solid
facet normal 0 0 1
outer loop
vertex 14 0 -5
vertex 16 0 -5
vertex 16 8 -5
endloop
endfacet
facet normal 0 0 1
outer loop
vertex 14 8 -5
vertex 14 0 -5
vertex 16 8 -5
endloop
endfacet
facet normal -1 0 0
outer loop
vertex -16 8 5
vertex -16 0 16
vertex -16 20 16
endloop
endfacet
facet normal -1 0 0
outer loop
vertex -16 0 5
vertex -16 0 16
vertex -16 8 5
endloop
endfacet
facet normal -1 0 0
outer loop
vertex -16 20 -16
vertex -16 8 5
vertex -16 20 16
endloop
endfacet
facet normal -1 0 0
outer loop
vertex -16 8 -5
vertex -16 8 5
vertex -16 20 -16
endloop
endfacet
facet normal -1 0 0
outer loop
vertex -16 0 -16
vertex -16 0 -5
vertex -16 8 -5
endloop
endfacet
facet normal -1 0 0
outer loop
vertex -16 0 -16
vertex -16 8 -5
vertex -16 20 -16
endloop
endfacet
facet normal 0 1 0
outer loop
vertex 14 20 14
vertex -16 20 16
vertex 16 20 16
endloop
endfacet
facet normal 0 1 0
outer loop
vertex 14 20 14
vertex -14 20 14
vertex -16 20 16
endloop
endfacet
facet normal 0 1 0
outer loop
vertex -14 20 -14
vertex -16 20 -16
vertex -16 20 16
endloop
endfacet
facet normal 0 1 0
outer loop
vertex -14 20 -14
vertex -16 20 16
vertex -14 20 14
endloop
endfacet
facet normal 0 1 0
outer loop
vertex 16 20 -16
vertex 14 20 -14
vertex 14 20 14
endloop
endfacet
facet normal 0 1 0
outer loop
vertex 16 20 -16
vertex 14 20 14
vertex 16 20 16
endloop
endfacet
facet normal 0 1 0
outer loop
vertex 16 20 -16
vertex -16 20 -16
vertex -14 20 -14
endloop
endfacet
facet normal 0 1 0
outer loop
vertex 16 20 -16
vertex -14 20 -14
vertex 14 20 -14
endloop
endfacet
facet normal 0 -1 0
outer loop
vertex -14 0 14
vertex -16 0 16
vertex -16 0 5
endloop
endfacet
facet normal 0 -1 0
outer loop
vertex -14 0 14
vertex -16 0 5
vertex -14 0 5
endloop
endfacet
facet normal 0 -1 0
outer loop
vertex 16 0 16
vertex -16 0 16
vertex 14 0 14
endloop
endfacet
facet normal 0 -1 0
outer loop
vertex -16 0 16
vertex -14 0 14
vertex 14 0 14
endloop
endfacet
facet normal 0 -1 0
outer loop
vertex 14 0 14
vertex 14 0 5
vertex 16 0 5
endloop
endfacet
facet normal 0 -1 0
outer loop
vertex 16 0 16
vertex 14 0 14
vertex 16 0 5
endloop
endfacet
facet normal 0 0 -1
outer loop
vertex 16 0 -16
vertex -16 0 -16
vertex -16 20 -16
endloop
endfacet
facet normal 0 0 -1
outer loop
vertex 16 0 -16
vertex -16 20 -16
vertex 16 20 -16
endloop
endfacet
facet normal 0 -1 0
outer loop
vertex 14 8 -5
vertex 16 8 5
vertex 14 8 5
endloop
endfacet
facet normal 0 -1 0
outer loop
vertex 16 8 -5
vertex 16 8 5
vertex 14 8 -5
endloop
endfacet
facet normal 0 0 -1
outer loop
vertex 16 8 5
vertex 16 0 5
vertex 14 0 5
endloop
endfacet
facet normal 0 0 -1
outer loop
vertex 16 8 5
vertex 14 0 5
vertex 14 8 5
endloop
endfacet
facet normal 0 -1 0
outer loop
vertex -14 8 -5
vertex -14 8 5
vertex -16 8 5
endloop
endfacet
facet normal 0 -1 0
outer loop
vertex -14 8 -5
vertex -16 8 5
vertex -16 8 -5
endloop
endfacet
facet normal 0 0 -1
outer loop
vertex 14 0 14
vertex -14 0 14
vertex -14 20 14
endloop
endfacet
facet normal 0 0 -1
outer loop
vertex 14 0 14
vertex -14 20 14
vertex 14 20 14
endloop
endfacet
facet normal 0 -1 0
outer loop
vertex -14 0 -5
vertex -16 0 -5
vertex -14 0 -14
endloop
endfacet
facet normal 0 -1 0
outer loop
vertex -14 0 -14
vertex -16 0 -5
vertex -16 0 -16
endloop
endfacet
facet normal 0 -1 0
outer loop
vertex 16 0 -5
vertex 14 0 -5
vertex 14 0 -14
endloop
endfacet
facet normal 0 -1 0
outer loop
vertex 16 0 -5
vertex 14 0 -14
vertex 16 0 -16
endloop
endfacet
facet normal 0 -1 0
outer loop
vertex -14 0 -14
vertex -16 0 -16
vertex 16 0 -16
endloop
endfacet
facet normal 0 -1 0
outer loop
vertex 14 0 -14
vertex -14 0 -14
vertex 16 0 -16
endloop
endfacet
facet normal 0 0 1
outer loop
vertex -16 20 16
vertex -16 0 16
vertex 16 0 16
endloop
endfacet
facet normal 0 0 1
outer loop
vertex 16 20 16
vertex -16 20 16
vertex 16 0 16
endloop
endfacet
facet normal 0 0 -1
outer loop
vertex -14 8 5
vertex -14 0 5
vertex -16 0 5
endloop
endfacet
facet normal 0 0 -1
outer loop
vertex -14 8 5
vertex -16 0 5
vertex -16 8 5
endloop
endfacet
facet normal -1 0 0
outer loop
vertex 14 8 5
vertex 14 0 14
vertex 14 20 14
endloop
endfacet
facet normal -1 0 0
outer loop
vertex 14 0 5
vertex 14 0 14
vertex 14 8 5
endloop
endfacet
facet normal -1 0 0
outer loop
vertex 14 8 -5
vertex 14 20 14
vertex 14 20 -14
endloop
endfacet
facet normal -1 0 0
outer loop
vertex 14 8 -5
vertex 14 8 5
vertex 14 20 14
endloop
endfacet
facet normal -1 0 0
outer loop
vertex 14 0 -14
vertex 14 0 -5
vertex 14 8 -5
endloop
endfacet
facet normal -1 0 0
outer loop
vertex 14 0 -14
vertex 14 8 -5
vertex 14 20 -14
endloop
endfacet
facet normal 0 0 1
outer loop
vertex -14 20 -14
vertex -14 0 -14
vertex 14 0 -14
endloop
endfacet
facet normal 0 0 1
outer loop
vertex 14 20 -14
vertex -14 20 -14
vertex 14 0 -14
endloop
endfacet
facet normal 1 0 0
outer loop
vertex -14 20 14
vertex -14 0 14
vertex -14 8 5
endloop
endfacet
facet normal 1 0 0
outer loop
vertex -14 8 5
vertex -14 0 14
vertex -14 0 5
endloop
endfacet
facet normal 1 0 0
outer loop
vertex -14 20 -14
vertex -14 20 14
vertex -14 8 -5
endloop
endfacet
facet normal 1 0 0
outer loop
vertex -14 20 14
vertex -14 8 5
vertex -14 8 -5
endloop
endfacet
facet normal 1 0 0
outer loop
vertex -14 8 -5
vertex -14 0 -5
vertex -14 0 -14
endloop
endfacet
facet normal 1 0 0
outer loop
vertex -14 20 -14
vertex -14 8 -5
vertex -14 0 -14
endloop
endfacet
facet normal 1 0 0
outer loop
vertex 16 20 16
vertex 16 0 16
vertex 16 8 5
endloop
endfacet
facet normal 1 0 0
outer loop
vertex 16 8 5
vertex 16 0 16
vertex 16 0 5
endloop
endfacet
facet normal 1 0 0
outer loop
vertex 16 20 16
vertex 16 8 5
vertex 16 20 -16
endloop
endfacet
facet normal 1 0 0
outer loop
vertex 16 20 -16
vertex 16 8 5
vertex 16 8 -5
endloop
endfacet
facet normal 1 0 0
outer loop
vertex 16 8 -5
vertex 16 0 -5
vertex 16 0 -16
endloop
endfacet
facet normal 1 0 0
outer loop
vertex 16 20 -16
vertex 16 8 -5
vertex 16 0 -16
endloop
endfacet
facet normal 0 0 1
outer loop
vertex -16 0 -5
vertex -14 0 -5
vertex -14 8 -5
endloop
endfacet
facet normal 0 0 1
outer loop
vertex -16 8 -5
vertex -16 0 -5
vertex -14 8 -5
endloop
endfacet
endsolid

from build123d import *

# Parameters (mm, degrees)
SKETCH1_W           = 32
SKETCH1_H           = 32
SKETCH1_W_2         = 28
SKETCH1_H_2         = 28
BOSS_EXTRUDE1_DEPTH = 20
SKETCH2_W           = 10
SKETCH2_H           = 8
CUT_EXTRUDE1_DEPTH  = 33


with BuildPart() as part:
    # Sketch1 → Boss-Extrude1 (new body)
    with BuildSketch(Plane(origin=(0, 0, 0), x_dir=(1, 0, 0), z_dir=(0, 1, 0))):
        Rectangle(SKETCH1_W, SKETCH1_H)
        Rectangle(SKETCH1_W_2, SKETCH1_H_2, mode=Mode.SUBTRACT)
    extrude(amount=BOSS_EXTRUDE1_DEPTH)

    # Sketch2 → Cut-Extrude1 (cut, through all)
    with BuildSketch(Plane(origin=(16, 0, 0), x_dir=(0, 0, -1), z_dir=(1, 0, 0))):
        with Locations((0, 4)):
            Rectangle(SKETCH2_W, SKETCH2_H)
    extrude(amount=-CUT_EXTRUDE1_DEPTH, mode=Mode.SUBTRACT)


solid = part.part
